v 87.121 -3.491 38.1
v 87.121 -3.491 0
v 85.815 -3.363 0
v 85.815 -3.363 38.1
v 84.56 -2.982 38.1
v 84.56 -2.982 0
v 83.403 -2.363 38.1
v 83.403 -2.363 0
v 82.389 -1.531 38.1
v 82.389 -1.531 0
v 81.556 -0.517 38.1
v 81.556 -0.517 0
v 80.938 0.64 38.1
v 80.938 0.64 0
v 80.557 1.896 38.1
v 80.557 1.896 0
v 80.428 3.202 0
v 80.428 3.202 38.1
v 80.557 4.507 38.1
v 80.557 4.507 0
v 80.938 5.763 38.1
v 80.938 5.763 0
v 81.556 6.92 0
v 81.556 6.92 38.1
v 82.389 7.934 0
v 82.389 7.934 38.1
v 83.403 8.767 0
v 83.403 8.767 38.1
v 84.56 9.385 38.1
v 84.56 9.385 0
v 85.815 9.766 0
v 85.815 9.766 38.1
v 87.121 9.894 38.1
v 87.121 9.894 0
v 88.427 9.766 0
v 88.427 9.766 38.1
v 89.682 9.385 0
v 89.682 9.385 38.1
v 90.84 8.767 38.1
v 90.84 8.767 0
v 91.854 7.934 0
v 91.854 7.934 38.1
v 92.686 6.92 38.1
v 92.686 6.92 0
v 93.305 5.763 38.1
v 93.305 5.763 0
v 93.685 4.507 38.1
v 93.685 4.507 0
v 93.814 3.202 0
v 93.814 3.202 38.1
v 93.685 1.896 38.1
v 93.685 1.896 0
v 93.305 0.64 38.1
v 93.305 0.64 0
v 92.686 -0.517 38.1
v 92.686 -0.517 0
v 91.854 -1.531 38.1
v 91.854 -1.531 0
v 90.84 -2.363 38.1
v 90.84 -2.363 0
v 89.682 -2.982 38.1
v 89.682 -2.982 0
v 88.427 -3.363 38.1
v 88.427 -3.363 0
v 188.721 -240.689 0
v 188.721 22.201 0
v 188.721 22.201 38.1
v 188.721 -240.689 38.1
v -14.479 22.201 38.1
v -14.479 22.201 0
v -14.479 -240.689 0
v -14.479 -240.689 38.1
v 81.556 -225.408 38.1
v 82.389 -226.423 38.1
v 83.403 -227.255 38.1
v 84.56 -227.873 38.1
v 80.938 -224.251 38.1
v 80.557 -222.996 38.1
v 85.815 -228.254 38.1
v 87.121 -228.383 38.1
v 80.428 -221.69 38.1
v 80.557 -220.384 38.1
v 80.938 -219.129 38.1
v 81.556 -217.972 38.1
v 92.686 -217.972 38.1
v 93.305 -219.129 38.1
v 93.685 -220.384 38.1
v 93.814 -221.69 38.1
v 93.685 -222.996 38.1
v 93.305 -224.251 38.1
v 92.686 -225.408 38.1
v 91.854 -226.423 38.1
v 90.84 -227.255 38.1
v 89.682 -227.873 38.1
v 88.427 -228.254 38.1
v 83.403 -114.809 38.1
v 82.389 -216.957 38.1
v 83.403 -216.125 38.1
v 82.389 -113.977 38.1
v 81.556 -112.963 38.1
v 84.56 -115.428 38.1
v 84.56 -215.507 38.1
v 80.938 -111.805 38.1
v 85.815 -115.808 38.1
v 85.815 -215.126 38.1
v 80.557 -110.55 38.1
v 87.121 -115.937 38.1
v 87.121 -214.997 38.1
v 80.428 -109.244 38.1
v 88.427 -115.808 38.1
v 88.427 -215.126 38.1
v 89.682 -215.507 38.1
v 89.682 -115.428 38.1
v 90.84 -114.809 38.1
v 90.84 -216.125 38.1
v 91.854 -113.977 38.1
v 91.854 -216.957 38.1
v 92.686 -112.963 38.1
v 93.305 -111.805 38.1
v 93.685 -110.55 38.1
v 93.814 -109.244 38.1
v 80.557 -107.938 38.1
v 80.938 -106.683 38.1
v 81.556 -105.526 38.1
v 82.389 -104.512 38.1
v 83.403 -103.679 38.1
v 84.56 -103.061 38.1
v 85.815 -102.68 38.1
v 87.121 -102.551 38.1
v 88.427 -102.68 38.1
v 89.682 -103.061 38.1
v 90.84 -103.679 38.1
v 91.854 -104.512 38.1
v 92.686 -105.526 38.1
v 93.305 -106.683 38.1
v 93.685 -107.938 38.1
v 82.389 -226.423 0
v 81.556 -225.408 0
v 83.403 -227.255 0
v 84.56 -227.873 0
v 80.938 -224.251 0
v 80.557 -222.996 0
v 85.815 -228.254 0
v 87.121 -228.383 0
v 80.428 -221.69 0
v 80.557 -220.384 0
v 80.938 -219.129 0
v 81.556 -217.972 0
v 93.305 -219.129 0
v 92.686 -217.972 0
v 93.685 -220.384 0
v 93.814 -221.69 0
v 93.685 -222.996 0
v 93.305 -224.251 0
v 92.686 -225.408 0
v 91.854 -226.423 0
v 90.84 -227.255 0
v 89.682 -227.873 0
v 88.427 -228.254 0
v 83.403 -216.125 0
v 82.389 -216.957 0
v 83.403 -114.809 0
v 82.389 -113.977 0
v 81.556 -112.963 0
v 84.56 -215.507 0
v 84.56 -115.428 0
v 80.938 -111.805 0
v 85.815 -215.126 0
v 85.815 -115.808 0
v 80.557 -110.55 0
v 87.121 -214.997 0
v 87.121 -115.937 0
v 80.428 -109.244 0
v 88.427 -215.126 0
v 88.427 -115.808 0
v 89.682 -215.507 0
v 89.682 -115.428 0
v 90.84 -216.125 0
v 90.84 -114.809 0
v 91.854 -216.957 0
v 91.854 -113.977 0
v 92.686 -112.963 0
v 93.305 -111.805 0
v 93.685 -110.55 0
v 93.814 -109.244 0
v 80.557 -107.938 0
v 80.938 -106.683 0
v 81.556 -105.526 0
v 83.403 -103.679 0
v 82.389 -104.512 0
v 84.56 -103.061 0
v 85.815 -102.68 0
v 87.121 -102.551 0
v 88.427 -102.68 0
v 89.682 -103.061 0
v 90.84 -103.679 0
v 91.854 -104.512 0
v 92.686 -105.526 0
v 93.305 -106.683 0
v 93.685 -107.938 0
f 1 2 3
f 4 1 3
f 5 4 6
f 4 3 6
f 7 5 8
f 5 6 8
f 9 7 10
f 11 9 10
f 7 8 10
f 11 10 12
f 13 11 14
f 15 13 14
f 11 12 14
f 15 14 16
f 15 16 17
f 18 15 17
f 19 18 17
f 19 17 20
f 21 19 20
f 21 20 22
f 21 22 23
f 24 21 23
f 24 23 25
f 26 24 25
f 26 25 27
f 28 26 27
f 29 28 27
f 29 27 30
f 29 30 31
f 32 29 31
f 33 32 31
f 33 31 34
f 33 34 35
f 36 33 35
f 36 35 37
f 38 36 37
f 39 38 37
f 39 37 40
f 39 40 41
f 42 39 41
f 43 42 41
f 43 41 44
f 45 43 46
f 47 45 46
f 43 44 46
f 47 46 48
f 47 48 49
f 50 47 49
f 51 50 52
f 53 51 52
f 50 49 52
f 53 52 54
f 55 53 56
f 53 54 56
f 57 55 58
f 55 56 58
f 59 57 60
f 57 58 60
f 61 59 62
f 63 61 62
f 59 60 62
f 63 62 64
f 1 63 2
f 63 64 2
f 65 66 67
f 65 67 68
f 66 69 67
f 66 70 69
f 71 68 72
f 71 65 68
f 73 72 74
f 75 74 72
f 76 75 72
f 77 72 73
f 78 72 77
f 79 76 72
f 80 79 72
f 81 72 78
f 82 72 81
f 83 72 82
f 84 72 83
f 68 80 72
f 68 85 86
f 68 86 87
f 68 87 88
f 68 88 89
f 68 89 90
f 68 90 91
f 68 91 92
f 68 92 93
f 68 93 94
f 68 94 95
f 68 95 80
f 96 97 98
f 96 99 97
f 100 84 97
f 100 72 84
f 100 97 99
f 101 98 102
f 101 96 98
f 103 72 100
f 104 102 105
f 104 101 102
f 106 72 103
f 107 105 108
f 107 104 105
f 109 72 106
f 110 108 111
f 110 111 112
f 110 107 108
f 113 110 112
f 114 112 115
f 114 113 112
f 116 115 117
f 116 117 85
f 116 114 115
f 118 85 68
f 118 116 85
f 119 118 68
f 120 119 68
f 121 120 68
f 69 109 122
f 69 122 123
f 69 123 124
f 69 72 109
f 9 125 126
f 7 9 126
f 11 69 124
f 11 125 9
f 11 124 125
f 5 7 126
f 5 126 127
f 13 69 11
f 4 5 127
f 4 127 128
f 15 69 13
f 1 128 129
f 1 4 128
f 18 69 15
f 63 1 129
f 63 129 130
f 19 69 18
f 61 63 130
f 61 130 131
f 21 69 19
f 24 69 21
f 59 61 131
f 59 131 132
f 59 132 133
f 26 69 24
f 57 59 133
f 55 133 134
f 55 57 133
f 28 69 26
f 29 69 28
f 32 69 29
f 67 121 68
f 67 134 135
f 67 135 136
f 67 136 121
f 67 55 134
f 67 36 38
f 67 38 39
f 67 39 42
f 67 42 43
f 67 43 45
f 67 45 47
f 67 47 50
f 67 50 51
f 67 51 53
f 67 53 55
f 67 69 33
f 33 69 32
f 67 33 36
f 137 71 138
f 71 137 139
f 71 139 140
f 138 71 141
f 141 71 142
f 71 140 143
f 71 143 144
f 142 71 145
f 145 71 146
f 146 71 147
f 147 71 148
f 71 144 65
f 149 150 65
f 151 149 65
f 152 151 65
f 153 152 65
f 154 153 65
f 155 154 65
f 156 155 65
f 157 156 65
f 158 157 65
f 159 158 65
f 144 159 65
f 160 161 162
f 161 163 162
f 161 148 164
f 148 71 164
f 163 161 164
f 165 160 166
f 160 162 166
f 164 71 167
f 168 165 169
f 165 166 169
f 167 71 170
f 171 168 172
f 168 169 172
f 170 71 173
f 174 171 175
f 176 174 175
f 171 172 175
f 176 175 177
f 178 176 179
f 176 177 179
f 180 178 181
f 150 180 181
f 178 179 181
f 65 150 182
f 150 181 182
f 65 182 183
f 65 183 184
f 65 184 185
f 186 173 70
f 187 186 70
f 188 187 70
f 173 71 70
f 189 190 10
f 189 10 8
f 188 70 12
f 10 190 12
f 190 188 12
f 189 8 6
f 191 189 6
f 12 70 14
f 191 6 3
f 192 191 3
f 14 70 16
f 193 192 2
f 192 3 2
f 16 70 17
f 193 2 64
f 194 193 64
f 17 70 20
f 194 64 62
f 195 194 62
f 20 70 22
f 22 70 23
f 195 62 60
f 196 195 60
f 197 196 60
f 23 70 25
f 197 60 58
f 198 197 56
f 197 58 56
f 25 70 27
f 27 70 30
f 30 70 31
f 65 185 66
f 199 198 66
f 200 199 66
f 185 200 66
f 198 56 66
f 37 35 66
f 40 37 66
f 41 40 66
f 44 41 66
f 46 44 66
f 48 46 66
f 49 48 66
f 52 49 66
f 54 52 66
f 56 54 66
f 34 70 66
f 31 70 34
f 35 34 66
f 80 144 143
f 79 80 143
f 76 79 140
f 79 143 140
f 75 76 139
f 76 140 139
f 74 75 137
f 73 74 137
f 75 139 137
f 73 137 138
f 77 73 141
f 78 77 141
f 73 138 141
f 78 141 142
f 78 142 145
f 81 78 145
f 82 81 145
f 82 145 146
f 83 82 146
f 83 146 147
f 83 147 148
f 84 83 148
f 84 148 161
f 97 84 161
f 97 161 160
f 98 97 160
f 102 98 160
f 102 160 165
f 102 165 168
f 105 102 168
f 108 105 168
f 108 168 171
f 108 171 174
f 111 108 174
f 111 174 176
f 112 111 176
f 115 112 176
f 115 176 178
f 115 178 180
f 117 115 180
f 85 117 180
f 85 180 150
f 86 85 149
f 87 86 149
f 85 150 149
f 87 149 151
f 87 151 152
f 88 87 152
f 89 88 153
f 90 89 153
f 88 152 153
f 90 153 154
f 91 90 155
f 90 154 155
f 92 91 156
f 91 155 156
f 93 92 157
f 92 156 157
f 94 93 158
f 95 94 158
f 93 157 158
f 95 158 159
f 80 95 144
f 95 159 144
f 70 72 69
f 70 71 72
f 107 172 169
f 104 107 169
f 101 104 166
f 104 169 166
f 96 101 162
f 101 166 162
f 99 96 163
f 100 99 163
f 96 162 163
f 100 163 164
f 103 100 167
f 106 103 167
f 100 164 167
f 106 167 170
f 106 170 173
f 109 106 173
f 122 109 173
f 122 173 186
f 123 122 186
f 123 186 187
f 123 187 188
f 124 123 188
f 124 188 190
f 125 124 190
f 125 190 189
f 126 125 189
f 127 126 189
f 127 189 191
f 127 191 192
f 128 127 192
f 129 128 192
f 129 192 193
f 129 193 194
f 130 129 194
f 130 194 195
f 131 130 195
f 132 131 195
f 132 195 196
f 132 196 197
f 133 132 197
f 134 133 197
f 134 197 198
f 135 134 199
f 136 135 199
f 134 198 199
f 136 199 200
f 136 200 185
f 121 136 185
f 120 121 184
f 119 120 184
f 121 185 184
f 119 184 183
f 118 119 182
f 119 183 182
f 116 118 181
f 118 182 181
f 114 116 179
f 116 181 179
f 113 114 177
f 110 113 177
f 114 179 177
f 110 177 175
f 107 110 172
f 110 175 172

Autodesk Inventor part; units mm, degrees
ref_plane "YZ Plane" through (0, 0, 0) normal (1, 0, 0) x (0, 1, 0)
ref_plane "XZ Plane" through (0, 0, 0) normal (0, 1, 0) x (-1, 0, 0)
sketch "Sketch1" plane through (0, 0, 0) normal (0, 0, 1) x (1, 0, 0)
  line L0 (-14.4788, 22.2008) -> (188.7212, 22.2008)
  line L1 (188.7212, 22.2008) -> (188.7212, -240.6892)
  line L2 (188.7212, -240.6892) -> (-14.4788, -240.6892)
  line L3 (-14.4788, -240.6892) -> (-14.4788, 22.2008)
  dimension "d0" = 203.2
  dimension "d1" = 262.89
extrude "Extrusion1" add sketch "Sketch1" along normal blind 38.1
sketch "Sketch2" plane through (0, 0, 38.1) normal (0, 0, 1) x (1, 0, 0)
  line L0 (188.7212, 22.2008) -> (188.7212, -240.6892) projected
  line L1 (-14.4788, 22.2008) -> (188.7212, 22.2008) projected
  point P0 (87.1212, -109.2442)
  dimension "d4" = 101.6
  dimension "d5" = 131.445
hole "Hole1" at (87.1212, -109.2442, 38.1) direction (0, 0, -1) diameter 13.3858 end through all thread size "5/8-11 UNC" class "1B" standard "ANSI Unified Screw Threads"
sketch "Sketch3" plane through (0, 0, 38.1) normal (0, 0, 1) x (1, 0, 0)
  circle A0 centre (87.1212, -109.2442) radius 6.6929 projected
  point P0 (87.1212, 3.2016)
  point P1 (87.1212, -221.69)
  dimension "d13" = 112.4458
  dimension "d14" = 112.4458
hole "Hole2" at (87.1212, 3.2016, 38.1) at (87.1212, -221.69, 38.1) direction (0, 0, -1) diameter 13.3858 end through all thread size "5/8-11 UNC" class "1B" standard "ANSI Unified Screw Threads"
ref_plane "Work Plane1" through (87.1212, -240.6892, 0) normal (1, 0, 0) x (0, 0, -1)
properties part number "Sideplate"
